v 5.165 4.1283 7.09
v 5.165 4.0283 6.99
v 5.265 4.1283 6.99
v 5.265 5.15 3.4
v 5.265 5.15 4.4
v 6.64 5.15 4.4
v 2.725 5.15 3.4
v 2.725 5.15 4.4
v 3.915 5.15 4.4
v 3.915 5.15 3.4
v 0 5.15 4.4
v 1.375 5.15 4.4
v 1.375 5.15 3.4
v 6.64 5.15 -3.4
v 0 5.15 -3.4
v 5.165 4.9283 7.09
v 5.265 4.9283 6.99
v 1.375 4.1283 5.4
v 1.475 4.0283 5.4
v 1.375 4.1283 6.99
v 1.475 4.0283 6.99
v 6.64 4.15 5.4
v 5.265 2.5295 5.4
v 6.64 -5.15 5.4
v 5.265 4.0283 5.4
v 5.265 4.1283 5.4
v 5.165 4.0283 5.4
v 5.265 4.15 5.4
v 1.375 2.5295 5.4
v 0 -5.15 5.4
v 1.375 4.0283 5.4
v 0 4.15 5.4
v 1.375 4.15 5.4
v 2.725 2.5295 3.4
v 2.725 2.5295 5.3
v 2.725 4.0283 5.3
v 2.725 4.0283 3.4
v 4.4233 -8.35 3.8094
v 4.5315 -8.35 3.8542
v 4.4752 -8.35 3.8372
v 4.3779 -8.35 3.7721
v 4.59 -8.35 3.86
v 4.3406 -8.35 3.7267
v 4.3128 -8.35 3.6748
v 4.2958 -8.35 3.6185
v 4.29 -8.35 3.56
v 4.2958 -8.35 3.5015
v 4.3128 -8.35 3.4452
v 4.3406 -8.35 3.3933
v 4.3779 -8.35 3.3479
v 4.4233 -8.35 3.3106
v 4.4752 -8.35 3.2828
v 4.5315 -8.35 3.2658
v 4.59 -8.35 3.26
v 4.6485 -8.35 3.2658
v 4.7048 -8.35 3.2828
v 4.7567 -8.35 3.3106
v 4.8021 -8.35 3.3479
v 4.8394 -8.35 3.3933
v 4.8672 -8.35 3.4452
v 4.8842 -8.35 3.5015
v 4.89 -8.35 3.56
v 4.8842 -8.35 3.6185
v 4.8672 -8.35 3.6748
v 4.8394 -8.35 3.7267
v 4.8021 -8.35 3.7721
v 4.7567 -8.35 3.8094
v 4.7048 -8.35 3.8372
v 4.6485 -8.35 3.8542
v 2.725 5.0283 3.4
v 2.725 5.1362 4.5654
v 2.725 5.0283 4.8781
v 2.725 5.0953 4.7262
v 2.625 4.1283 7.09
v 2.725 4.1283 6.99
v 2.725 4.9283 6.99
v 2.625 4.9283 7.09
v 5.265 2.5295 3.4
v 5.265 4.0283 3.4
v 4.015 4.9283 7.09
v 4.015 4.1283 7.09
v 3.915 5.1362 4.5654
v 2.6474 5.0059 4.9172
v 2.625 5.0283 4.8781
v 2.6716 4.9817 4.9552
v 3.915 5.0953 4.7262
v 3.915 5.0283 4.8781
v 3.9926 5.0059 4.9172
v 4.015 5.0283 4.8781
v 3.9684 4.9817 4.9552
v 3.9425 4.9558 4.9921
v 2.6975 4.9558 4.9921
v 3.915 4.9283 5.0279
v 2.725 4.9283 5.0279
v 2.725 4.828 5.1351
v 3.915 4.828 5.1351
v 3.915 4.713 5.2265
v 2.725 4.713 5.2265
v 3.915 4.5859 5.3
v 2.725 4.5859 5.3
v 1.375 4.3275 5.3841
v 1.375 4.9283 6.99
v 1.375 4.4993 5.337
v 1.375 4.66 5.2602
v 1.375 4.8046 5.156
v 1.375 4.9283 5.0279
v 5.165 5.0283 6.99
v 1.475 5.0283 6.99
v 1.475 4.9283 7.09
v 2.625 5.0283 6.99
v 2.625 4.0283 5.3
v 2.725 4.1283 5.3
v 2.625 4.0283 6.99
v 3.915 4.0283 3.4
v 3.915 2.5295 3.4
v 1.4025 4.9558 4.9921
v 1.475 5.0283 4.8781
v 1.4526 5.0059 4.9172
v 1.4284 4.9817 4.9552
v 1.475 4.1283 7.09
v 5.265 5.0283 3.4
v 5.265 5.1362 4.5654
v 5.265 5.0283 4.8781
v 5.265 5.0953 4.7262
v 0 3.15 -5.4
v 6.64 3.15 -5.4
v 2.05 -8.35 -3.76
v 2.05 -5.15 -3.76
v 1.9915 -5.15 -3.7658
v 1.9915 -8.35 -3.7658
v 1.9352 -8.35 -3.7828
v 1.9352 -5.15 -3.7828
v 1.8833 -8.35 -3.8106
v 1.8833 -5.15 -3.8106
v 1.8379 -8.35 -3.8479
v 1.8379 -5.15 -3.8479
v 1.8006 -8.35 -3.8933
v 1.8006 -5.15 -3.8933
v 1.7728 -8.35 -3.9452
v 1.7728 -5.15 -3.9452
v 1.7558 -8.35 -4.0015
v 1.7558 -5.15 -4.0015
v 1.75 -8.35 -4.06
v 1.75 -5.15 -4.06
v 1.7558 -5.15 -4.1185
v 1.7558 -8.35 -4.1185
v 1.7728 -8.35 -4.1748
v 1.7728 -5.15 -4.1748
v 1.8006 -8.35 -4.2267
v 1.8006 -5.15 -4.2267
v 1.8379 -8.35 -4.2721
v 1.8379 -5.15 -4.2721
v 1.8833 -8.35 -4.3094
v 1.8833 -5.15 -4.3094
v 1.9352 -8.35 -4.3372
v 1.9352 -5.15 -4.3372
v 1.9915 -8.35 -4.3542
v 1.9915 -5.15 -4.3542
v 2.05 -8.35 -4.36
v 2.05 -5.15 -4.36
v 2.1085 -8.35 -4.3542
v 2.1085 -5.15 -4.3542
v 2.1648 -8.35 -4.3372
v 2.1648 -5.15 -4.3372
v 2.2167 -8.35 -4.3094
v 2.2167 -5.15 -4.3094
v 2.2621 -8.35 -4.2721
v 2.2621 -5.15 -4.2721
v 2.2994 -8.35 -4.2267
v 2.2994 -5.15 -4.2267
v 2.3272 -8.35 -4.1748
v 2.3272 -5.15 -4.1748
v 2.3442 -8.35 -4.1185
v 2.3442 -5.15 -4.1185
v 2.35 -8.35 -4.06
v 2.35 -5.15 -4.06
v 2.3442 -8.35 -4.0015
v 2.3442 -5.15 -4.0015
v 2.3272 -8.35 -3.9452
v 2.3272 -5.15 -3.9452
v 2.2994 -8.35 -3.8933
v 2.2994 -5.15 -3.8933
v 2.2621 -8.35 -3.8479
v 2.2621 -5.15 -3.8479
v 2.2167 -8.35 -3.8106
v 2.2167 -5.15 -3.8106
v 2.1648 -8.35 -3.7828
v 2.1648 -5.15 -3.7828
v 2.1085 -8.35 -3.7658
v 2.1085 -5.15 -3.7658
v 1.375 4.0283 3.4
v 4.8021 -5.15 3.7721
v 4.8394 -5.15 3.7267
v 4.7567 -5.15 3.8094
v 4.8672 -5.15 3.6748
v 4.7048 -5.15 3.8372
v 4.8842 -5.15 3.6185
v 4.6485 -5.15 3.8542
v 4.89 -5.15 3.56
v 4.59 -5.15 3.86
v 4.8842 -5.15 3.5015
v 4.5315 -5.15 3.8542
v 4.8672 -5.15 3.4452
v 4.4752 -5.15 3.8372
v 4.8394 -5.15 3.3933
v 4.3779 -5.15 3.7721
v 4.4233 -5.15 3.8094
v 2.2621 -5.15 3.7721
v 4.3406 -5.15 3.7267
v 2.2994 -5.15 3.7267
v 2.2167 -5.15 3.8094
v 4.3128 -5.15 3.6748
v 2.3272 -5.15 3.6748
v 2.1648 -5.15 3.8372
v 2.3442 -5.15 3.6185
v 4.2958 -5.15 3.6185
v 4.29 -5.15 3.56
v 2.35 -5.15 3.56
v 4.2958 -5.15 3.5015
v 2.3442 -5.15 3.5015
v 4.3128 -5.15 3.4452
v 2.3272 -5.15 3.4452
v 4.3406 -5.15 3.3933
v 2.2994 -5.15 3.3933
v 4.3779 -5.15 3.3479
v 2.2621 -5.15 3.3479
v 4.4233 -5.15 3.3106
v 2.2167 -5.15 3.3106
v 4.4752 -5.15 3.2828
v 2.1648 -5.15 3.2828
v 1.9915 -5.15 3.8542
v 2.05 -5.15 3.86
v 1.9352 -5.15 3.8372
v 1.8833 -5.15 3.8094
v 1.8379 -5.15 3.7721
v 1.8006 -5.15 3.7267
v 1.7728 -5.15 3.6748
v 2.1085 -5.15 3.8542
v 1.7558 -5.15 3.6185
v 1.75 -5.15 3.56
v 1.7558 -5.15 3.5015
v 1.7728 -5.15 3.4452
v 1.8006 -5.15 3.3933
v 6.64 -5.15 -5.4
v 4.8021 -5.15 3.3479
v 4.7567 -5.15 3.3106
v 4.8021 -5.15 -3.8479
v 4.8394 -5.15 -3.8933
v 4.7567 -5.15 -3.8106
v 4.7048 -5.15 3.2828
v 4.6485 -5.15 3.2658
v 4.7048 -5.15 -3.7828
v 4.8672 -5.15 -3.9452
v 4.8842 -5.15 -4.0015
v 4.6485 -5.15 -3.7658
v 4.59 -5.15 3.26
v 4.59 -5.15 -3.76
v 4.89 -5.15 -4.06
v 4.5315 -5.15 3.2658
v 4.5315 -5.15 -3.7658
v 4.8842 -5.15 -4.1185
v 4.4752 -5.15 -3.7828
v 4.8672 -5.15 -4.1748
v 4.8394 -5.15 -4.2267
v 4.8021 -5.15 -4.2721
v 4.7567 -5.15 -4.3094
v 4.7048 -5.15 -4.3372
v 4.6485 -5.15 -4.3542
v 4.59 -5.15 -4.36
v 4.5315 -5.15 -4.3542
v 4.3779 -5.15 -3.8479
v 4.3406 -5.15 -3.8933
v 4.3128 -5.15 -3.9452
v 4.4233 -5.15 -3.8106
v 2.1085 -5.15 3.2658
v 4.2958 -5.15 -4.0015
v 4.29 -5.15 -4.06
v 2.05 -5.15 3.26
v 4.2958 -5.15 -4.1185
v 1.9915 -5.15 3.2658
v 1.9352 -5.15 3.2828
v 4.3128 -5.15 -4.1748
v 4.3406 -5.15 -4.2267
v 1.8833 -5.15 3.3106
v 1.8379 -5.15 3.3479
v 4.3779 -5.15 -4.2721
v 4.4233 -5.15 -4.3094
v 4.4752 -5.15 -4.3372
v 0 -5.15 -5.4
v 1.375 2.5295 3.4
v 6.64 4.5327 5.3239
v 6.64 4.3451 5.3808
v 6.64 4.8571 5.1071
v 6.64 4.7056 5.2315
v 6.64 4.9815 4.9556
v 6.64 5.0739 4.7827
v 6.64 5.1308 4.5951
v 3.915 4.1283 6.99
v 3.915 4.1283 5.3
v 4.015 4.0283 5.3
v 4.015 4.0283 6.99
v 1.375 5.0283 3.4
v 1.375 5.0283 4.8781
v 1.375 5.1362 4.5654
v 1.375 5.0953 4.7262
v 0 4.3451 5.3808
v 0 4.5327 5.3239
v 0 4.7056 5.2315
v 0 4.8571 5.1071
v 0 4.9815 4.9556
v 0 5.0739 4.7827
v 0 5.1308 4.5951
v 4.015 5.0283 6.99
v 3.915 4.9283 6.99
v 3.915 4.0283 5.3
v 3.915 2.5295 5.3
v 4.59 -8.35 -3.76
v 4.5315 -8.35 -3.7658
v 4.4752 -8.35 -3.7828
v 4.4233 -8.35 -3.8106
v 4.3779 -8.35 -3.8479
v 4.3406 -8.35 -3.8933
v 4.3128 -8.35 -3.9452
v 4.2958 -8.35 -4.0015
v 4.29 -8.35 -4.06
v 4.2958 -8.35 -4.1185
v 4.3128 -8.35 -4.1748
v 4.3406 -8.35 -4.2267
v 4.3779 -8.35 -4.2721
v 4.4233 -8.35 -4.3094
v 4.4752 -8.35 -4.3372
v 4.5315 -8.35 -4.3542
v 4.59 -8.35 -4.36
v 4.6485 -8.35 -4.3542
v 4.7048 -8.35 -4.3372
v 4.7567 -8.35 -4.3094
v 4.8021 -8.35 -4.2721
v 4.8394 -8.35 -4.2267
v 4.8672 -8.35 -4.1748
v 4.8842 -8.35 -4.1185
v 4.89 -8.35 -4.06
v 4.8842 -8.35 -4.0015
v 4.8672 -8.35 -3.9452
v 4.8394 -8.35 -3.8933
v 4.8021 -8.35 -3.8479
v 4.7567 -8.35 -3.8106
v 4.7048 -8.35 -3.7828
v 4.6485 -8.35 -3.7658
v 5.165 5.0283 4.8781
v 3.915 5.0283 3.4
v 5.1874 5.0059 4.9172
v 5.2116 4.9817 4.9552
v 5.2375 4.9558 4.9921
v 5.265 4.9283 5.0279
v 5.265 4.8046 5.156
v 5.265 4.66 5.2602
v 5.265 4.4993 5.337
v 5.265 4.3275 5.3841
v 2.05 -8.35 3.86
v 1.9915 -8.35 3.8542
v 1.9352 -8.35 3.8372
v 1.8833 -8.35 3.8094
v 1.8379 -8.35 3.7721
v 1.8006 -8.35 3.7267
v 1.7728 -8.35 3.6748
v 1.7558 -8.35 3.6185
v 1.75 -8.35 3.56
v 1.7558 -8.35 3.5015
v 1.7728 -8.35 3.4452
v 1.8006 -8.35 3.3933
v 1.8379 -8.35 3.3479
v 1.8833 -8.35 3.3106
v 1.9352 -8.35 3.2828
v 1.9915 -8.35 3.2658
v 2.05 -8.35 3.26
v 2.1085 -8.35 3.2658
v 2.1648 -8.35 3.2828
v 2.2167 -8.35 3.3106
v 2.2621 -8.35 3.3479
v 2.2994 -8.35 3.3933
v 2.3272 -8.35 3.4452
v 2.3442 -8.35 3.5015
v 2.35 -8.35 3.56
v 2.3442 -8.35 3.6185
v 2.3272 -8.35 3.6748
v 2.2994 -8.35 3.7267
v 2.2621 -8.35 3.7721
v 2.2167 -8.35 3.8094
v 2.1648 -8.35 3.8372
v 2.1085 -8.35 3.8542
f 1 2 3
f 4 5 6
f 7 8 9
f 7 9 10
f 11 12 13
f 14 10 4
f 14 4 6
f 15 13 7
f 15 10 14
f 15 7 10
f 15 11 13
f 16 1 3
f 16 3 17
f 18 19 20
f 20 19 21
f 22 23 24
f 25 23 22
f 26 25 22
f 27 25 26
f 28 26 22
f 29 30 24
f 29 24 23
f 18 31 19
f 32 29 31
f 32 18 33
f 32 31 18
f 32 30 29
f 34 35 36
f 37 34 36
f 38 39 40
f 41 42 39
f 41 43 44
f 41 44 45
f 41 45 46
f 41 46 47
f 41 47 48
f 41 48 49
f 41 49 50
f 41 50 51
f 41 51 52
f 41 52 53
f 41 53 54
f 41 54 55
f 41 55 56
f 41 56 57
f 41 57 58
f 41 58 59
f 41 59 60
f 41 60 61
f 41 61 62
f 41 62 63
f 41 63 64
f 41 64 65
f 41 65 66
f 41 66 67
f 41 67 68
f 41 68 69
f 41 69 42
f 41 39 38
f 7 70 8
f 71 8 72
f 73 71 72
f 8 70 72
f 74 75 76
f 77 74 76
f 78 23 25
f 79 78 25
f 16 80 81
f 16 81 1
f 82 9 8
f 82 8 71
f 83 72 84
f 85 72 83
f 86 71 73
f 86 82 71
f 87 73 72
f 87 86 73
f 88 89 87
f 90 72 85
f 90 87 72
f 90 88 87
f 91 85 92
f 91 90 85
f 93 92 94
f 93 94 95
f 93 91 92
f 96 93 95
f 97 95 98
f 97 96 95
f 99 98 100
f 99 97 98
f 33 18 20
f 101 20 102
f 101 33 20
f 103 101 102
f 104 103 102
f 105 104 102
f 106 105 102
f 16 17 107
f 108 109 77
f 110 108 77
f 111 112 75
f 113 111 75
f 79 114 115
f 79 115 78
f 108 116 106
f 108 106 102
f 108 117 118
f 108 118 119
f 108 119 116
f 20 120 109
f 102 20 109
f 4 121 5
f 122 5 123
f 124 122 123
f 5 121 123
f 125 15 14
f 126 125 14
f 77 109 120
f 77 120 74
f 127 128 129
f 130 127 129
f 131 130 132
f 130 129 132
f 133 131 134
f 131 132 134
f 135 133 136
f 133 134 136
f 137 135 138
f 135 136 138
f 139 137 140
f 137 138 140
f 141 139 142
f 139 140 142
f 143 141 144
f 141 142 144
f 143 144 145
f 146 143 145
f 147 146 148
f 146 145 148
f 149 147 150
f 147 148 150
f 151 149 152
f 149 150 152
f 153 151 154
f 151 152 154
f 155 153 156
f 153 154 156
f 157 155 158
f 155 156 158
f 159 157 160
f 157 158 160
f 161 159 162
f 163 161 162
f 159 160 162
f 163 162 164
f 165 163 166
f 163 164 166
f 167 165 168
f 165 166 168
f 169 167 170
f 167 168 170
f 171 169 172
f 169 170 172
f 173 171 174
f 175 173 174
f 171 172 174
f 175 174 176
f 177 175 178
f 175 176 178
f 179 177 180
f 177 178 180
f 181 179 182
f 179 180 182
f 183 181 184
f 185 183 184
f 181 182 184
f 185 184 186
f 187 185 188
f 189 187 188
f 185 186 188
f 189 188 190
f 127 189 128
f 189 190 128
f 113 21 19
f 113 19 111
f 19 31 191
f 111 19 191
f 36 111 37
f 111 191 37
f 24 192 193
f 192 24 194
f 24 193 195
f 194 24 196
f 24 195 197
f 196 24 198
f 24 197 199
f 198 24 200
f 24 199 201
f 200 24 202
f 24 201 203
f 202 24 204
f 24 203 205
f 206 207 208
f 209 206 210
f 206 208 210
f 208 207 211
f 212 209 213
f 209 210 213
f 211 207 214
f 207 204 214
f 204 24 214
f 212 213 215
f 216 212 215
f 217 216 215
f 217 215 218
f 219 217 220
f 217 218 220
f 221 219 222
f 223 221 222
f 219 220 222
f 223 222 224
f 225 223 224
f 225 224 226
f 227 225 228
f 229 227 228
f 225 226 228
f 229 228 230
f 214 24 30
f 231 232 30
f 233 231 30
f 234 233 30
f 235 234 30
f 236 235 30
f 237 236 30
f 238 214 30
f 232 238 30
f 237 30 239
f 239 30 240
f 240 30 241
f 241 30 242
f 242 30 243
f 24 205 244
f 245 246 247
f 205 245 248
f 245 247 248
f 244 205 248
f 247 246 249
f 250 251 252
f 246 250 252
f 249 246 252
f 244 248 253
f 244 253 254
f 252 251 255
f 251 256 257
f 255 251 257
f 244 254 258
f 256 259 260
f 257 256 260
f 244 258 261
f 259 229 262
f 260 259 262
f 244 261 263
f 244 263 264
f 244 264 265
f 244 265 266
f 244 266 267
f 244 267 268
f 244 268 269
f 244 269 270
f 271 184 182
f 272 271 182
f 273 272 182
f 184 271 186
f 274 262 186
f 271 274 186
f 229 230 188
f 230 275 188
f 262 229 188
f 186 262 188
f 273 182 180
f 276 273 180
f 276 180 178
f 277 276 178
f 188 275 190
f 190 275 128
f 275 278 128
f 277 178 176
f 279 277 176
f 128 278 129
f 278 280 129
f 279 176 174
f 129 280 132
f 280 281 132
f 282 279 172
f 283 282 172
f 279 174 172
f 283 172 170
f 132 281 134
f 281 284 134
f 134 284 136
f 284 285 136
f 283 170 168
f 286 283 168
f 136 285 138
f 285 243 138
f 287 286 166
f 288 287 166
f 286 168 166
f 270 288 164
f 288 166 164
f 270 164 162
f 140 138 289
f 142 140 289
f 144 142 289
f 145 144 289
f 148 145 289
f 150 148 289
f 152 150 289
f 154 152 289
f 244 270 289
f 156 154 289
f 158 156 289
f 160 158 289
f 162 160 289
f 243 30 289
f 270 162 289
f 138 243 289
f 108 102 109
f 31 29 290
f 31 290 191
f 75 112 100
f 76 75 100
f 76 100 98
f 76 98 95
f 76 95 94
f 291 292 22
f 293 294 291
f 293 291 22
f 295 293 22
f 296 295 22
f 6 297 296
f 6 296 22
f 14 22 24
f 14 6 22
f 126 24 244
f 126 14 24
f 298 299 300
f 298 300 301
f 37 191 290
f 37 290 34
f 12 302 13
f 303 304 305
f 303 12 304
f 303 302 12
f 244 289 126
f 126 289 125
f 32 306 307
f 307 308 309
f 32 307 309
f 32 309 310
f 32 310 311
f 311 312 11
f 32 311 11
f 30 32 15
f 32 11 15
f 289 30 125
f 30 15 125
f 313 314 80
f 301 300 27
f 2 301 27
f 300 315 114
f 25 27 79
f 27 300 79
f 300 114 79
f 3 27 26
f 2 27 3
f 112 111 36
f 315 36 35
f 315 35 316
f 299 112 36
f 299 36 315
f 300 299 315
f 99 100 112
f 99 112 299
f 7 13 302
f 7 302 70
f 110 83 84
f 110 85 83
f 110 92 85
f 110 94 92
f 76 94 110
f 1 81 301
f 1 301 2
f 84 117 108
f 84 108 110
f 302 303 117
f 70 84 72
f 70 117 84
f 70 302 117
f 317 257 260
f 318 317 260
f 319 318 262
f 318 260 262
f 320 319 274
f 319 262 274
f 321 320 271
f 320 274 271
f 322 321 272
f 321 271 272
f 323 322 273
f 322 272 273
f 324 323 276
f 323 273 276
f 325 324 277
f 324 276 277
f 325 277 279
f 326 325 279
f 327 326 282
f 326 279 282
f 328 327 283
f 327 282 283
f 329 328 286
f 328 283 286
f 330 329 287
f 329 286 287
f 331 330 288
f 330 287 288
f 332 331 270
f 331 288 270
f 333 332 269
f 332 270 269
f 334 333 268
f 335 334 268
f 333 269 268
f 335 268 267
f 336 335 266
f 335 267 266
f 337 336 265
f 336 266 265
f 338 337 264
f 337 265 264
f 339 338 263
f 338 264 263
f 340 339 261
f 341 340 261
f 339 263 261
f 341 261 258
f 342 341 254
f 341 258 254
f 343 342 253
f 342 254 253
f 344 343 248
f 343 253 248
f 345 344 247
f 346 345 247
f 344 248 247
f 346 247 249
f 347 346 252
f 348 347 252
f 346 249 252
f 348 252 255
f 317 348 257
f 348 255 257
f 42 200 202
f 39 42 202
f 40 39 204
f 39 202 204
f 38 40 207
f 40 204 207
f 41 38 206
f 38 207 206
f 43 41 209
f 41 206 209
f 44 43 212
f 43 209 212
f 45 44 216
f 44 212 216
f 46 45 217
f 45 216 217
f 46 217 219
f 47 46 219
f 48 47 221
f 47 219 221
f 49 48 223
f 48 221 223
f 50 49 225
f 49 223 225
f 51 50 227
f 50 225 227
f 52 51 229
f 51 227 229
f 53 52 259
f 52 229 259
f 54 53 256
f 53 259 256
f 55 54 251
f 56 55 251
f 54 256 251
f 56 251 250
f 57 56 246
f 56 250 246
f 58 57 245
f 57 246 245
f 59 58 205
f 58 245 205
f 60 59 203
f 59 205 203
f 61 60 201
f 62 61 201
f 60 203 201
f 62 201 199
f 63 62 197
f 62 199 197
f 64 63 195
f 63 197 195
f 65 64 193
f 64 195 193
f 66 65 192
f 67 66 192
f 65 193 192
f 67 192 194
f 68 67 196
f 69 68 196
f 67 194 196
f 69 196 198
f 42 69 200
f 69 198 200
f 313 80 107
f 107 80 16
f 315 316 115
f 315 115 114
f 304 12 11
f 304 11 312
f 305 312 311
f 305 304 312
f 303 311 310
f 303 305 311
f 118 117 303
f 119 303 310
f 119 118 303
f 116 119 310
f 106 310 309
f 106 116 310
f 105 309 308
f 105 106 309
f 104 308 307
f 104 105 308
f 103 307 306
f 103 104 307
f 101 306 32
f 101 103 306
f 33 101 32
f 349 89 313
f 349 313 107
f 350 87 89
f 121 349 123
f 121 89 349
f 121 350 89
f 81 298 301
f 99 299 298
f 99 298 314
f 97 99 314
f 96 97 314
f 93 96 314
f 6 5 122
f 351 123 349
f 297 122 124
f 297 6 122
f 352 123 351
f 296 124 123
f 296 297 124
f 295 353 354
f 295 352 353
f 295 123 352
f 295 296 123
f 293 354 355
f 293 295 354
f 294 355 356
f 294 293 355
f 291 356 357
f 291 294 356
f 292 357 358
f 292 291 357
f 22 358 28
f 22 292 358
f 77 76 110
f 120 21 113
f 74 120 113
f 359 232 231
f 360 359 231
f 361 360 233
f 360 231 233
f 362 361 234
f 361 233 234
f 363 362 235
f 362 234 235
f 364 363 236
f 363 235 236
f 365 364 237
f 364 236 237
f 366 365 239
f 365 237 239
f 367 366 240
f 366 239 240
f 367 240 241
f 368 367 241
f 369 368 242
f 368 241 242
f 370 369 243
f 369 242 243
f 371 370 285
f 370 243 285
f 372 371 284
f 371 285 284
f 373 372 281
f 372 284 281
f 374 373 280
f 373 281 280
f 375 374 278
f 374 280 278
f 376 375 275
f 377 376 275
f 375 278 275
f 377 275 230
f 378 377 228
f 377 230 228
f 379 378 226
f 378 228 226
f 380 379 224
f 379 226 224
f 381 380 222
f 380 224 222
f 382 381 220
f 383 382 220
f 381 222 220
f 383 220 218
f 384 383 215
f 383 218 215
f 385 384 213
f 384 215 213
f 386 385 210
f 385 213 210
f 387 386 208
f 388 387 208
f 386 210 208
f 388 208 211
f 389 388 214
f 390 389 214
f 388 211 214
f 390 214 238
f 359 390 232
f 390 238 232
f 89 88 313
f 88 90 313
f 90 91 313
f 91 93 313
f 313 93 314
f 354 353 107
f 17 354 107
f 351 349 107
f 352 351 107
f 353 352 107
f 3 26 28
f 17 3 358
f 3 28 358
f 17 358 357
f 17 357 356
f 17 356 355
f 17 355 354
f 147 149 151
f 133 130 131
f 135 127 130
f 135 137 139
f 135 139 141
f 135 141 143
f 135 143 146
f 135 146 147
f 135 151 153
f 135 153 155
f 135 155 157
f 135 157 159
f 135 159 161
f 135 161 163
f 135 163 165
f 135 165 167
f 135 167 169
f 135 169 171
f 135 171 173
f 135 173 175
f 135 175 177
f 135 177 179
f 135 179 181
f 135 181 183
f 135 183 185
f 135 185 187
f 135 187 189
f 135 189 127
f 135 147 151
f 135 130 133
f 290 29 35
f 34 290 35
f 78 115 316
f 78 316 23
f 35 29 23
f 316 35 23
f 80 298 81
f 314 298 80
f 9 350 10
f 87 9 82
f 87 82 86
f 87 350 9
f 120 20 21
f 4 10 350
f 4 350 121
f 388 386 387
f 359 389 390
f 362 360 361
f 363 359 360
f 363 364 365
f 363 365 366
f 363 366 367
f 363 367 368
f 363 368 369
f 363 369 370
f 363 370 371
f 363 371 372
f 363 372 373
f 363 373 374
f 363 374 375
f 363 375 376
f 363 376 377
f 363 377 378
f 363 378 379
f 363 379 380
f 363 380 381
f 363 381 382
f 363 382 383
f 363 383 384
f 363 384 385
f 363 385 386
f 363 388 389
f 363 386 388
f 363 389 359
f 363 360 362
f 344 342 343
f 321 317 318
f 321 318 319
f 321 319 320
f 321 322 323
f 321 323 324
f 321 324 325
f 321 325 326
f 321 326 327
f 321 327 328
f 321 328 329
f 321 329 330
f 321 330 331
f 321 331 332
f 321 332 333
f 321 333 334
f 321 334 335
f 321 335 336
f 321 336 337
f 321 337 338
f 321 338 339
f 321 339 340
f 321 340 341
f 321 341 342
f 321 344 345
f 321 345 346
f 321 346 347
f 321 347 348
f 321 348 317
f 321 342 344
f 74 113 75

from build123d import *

# Parameters (mm, degrees)
SKETCH_1_W          = 10.8
SKETCH_1_H          = 10.3
EXTRUDE_1_DEPTH     = 6.64
CHAMFER_1_SIZE      = 2
SKETCH_2_R          = 0.3
EXTRUDE_2_DEPTH     = 3.2
FILLET_1_R          = 1
SKETCH_3_W          = 1.35
SKETCH_3_H          = 2.620478626
CUT_EXTRUDE_1_DEPTH = 2
SKETCH_4_W          = 3.89
SKETCH_4_H          = 2.620478626
CUT_EXTRUDE_2_DEPTH = 0.1
SKETCH_5_W          = 1.35
SKETCH_5_H          = 1
EXTRUDE_3_DEPTH     = 3.69
CHAMFER_2_SIZE      = 0.1


with BuildPart() as part:
    # Эскиз1 → Вытянуть1 (new body)
    with BuildSketch(Plane(origin=(0, 0, 0), x_dir=(0, 0, -1), z_dir=(1, 0, 0))):
        Rectangle(SKETCH_1_W, SKETCH_1_H)
    extrude(amount=EXTRUDE_1_DEPTH)

    # Фаска1
    chamfer_1_edges = [part.edges().sort_by_distance(p)[0] for p in [
        (3.32, 5.15, -5.4),
    ]]
    chamfer(chamfer_1_edges, length=CHAMFER_1_SIZE)

    # Эскиз2 → Вытянуть2 (add)
    with BuildSketch(Plane.XZ.offset(5.15)):
        with Locations(Location((2.05, 3.56, 0), (0, 0, 90))):
            Circle(SKETCH_2_R)
        with Locations(Location((4.59, 3.56, 0), (0, 0, 90))):
            Circle(SKETCH_2_R)
        with Locations(Location((2.05, -4.06, 0), (0, 0, 90))):
            Circle(SKETCH_2_R)
        with Locations(Location((4.59, -4.06, 0), (0, 0, 90))):
            Circle(SKETCH_2_R)
    extrude(amount=EXTRUDE_2_DEPTH)

    # Скругление1
    fillet_1_edges = [part.edges().sort_by_distance(p)[0] for p in [
        (3.32, 5.15, 5.4),
    ]]
    fillet(fillet_1_edges, radius=FILLET_1_R)

    # Эскиз3 → Вырез-Вытянуть1 (cut)
    with BuildSketch(Plane.XY.offset(5.4)):
        with Locations((2.05, 3.839760687)):
            Rectangle(SKETCH_3_W, SKETCH_3_H)
        with Locations((4.59, 3.839760687)):
            Rectangle(SKETCH_3_W, SKETCH_3_H)
    extrude(amount=-CUT_EXTRUDE_1_DEPTH, mode=Mode.SUBTRACT)

    # Эскиз4 → Вырез-Вытянуть2 (cut)
    with BuildSketch(Plane.XY.offset(5.4)):
        with Locations((3.32, 3.839760687)):
            Rectangle(SKETCH_4_W, SKETCH_4_H)
    extrude(amount=-CUT_EXTRUDE_2_DEPTH, mode=Mode.SUBTRACT)

    # Эскиз5 → Вытянуть3 (add)
    with BuildSketch(Plane.XY.offset(3.4)):
        with Locations((2.05, 4.528321525)):
            Rectangle(SKETCH_5_W, SKETCH_5_H)
        with Locations((4.59, 4.528321525)):
            Rectangle(SKETCH_5_W, SKETCH_5_H)
    extrude(amount=EXTRUDE_3_DEPTH)

    # Фаска2
    chamfer_2_edges = [part.edges().sort_by_distance(p)[0] for p in [
        (1.375, 5.028321525, 5.984035196),
        (1.375, 4.028321525, 6.245),
        (2.725, 4.028321525, 6.195),
        (2.725, 5.028321525, 5.984035196),
        (1.375, 4.528321525, 7.09),
        (2.05, 4.028321525, 7.09),
        (2.725, 4.528321525, 7.09),
        (2.05, 5.028321525, 7.09),
        (5.265, 4.028321525, 6.245),
        (3.915, 5.028321525, 5.984035196),
        (3.915, 4.028321525, 6.195),
        (5.265, 5.028321525, 5.984035196),
        (3.915, 4.528321525, 7.09),
        (4.59, 4.028321525, 7.09),
        (5.265, 4.528321525, 7.09),
        (4.59, 5.028321525, 7.09),
    ]]
    chamfer(chamfer_2_edges, length=CHAMFER_2_SIZE)


solid = part.part
